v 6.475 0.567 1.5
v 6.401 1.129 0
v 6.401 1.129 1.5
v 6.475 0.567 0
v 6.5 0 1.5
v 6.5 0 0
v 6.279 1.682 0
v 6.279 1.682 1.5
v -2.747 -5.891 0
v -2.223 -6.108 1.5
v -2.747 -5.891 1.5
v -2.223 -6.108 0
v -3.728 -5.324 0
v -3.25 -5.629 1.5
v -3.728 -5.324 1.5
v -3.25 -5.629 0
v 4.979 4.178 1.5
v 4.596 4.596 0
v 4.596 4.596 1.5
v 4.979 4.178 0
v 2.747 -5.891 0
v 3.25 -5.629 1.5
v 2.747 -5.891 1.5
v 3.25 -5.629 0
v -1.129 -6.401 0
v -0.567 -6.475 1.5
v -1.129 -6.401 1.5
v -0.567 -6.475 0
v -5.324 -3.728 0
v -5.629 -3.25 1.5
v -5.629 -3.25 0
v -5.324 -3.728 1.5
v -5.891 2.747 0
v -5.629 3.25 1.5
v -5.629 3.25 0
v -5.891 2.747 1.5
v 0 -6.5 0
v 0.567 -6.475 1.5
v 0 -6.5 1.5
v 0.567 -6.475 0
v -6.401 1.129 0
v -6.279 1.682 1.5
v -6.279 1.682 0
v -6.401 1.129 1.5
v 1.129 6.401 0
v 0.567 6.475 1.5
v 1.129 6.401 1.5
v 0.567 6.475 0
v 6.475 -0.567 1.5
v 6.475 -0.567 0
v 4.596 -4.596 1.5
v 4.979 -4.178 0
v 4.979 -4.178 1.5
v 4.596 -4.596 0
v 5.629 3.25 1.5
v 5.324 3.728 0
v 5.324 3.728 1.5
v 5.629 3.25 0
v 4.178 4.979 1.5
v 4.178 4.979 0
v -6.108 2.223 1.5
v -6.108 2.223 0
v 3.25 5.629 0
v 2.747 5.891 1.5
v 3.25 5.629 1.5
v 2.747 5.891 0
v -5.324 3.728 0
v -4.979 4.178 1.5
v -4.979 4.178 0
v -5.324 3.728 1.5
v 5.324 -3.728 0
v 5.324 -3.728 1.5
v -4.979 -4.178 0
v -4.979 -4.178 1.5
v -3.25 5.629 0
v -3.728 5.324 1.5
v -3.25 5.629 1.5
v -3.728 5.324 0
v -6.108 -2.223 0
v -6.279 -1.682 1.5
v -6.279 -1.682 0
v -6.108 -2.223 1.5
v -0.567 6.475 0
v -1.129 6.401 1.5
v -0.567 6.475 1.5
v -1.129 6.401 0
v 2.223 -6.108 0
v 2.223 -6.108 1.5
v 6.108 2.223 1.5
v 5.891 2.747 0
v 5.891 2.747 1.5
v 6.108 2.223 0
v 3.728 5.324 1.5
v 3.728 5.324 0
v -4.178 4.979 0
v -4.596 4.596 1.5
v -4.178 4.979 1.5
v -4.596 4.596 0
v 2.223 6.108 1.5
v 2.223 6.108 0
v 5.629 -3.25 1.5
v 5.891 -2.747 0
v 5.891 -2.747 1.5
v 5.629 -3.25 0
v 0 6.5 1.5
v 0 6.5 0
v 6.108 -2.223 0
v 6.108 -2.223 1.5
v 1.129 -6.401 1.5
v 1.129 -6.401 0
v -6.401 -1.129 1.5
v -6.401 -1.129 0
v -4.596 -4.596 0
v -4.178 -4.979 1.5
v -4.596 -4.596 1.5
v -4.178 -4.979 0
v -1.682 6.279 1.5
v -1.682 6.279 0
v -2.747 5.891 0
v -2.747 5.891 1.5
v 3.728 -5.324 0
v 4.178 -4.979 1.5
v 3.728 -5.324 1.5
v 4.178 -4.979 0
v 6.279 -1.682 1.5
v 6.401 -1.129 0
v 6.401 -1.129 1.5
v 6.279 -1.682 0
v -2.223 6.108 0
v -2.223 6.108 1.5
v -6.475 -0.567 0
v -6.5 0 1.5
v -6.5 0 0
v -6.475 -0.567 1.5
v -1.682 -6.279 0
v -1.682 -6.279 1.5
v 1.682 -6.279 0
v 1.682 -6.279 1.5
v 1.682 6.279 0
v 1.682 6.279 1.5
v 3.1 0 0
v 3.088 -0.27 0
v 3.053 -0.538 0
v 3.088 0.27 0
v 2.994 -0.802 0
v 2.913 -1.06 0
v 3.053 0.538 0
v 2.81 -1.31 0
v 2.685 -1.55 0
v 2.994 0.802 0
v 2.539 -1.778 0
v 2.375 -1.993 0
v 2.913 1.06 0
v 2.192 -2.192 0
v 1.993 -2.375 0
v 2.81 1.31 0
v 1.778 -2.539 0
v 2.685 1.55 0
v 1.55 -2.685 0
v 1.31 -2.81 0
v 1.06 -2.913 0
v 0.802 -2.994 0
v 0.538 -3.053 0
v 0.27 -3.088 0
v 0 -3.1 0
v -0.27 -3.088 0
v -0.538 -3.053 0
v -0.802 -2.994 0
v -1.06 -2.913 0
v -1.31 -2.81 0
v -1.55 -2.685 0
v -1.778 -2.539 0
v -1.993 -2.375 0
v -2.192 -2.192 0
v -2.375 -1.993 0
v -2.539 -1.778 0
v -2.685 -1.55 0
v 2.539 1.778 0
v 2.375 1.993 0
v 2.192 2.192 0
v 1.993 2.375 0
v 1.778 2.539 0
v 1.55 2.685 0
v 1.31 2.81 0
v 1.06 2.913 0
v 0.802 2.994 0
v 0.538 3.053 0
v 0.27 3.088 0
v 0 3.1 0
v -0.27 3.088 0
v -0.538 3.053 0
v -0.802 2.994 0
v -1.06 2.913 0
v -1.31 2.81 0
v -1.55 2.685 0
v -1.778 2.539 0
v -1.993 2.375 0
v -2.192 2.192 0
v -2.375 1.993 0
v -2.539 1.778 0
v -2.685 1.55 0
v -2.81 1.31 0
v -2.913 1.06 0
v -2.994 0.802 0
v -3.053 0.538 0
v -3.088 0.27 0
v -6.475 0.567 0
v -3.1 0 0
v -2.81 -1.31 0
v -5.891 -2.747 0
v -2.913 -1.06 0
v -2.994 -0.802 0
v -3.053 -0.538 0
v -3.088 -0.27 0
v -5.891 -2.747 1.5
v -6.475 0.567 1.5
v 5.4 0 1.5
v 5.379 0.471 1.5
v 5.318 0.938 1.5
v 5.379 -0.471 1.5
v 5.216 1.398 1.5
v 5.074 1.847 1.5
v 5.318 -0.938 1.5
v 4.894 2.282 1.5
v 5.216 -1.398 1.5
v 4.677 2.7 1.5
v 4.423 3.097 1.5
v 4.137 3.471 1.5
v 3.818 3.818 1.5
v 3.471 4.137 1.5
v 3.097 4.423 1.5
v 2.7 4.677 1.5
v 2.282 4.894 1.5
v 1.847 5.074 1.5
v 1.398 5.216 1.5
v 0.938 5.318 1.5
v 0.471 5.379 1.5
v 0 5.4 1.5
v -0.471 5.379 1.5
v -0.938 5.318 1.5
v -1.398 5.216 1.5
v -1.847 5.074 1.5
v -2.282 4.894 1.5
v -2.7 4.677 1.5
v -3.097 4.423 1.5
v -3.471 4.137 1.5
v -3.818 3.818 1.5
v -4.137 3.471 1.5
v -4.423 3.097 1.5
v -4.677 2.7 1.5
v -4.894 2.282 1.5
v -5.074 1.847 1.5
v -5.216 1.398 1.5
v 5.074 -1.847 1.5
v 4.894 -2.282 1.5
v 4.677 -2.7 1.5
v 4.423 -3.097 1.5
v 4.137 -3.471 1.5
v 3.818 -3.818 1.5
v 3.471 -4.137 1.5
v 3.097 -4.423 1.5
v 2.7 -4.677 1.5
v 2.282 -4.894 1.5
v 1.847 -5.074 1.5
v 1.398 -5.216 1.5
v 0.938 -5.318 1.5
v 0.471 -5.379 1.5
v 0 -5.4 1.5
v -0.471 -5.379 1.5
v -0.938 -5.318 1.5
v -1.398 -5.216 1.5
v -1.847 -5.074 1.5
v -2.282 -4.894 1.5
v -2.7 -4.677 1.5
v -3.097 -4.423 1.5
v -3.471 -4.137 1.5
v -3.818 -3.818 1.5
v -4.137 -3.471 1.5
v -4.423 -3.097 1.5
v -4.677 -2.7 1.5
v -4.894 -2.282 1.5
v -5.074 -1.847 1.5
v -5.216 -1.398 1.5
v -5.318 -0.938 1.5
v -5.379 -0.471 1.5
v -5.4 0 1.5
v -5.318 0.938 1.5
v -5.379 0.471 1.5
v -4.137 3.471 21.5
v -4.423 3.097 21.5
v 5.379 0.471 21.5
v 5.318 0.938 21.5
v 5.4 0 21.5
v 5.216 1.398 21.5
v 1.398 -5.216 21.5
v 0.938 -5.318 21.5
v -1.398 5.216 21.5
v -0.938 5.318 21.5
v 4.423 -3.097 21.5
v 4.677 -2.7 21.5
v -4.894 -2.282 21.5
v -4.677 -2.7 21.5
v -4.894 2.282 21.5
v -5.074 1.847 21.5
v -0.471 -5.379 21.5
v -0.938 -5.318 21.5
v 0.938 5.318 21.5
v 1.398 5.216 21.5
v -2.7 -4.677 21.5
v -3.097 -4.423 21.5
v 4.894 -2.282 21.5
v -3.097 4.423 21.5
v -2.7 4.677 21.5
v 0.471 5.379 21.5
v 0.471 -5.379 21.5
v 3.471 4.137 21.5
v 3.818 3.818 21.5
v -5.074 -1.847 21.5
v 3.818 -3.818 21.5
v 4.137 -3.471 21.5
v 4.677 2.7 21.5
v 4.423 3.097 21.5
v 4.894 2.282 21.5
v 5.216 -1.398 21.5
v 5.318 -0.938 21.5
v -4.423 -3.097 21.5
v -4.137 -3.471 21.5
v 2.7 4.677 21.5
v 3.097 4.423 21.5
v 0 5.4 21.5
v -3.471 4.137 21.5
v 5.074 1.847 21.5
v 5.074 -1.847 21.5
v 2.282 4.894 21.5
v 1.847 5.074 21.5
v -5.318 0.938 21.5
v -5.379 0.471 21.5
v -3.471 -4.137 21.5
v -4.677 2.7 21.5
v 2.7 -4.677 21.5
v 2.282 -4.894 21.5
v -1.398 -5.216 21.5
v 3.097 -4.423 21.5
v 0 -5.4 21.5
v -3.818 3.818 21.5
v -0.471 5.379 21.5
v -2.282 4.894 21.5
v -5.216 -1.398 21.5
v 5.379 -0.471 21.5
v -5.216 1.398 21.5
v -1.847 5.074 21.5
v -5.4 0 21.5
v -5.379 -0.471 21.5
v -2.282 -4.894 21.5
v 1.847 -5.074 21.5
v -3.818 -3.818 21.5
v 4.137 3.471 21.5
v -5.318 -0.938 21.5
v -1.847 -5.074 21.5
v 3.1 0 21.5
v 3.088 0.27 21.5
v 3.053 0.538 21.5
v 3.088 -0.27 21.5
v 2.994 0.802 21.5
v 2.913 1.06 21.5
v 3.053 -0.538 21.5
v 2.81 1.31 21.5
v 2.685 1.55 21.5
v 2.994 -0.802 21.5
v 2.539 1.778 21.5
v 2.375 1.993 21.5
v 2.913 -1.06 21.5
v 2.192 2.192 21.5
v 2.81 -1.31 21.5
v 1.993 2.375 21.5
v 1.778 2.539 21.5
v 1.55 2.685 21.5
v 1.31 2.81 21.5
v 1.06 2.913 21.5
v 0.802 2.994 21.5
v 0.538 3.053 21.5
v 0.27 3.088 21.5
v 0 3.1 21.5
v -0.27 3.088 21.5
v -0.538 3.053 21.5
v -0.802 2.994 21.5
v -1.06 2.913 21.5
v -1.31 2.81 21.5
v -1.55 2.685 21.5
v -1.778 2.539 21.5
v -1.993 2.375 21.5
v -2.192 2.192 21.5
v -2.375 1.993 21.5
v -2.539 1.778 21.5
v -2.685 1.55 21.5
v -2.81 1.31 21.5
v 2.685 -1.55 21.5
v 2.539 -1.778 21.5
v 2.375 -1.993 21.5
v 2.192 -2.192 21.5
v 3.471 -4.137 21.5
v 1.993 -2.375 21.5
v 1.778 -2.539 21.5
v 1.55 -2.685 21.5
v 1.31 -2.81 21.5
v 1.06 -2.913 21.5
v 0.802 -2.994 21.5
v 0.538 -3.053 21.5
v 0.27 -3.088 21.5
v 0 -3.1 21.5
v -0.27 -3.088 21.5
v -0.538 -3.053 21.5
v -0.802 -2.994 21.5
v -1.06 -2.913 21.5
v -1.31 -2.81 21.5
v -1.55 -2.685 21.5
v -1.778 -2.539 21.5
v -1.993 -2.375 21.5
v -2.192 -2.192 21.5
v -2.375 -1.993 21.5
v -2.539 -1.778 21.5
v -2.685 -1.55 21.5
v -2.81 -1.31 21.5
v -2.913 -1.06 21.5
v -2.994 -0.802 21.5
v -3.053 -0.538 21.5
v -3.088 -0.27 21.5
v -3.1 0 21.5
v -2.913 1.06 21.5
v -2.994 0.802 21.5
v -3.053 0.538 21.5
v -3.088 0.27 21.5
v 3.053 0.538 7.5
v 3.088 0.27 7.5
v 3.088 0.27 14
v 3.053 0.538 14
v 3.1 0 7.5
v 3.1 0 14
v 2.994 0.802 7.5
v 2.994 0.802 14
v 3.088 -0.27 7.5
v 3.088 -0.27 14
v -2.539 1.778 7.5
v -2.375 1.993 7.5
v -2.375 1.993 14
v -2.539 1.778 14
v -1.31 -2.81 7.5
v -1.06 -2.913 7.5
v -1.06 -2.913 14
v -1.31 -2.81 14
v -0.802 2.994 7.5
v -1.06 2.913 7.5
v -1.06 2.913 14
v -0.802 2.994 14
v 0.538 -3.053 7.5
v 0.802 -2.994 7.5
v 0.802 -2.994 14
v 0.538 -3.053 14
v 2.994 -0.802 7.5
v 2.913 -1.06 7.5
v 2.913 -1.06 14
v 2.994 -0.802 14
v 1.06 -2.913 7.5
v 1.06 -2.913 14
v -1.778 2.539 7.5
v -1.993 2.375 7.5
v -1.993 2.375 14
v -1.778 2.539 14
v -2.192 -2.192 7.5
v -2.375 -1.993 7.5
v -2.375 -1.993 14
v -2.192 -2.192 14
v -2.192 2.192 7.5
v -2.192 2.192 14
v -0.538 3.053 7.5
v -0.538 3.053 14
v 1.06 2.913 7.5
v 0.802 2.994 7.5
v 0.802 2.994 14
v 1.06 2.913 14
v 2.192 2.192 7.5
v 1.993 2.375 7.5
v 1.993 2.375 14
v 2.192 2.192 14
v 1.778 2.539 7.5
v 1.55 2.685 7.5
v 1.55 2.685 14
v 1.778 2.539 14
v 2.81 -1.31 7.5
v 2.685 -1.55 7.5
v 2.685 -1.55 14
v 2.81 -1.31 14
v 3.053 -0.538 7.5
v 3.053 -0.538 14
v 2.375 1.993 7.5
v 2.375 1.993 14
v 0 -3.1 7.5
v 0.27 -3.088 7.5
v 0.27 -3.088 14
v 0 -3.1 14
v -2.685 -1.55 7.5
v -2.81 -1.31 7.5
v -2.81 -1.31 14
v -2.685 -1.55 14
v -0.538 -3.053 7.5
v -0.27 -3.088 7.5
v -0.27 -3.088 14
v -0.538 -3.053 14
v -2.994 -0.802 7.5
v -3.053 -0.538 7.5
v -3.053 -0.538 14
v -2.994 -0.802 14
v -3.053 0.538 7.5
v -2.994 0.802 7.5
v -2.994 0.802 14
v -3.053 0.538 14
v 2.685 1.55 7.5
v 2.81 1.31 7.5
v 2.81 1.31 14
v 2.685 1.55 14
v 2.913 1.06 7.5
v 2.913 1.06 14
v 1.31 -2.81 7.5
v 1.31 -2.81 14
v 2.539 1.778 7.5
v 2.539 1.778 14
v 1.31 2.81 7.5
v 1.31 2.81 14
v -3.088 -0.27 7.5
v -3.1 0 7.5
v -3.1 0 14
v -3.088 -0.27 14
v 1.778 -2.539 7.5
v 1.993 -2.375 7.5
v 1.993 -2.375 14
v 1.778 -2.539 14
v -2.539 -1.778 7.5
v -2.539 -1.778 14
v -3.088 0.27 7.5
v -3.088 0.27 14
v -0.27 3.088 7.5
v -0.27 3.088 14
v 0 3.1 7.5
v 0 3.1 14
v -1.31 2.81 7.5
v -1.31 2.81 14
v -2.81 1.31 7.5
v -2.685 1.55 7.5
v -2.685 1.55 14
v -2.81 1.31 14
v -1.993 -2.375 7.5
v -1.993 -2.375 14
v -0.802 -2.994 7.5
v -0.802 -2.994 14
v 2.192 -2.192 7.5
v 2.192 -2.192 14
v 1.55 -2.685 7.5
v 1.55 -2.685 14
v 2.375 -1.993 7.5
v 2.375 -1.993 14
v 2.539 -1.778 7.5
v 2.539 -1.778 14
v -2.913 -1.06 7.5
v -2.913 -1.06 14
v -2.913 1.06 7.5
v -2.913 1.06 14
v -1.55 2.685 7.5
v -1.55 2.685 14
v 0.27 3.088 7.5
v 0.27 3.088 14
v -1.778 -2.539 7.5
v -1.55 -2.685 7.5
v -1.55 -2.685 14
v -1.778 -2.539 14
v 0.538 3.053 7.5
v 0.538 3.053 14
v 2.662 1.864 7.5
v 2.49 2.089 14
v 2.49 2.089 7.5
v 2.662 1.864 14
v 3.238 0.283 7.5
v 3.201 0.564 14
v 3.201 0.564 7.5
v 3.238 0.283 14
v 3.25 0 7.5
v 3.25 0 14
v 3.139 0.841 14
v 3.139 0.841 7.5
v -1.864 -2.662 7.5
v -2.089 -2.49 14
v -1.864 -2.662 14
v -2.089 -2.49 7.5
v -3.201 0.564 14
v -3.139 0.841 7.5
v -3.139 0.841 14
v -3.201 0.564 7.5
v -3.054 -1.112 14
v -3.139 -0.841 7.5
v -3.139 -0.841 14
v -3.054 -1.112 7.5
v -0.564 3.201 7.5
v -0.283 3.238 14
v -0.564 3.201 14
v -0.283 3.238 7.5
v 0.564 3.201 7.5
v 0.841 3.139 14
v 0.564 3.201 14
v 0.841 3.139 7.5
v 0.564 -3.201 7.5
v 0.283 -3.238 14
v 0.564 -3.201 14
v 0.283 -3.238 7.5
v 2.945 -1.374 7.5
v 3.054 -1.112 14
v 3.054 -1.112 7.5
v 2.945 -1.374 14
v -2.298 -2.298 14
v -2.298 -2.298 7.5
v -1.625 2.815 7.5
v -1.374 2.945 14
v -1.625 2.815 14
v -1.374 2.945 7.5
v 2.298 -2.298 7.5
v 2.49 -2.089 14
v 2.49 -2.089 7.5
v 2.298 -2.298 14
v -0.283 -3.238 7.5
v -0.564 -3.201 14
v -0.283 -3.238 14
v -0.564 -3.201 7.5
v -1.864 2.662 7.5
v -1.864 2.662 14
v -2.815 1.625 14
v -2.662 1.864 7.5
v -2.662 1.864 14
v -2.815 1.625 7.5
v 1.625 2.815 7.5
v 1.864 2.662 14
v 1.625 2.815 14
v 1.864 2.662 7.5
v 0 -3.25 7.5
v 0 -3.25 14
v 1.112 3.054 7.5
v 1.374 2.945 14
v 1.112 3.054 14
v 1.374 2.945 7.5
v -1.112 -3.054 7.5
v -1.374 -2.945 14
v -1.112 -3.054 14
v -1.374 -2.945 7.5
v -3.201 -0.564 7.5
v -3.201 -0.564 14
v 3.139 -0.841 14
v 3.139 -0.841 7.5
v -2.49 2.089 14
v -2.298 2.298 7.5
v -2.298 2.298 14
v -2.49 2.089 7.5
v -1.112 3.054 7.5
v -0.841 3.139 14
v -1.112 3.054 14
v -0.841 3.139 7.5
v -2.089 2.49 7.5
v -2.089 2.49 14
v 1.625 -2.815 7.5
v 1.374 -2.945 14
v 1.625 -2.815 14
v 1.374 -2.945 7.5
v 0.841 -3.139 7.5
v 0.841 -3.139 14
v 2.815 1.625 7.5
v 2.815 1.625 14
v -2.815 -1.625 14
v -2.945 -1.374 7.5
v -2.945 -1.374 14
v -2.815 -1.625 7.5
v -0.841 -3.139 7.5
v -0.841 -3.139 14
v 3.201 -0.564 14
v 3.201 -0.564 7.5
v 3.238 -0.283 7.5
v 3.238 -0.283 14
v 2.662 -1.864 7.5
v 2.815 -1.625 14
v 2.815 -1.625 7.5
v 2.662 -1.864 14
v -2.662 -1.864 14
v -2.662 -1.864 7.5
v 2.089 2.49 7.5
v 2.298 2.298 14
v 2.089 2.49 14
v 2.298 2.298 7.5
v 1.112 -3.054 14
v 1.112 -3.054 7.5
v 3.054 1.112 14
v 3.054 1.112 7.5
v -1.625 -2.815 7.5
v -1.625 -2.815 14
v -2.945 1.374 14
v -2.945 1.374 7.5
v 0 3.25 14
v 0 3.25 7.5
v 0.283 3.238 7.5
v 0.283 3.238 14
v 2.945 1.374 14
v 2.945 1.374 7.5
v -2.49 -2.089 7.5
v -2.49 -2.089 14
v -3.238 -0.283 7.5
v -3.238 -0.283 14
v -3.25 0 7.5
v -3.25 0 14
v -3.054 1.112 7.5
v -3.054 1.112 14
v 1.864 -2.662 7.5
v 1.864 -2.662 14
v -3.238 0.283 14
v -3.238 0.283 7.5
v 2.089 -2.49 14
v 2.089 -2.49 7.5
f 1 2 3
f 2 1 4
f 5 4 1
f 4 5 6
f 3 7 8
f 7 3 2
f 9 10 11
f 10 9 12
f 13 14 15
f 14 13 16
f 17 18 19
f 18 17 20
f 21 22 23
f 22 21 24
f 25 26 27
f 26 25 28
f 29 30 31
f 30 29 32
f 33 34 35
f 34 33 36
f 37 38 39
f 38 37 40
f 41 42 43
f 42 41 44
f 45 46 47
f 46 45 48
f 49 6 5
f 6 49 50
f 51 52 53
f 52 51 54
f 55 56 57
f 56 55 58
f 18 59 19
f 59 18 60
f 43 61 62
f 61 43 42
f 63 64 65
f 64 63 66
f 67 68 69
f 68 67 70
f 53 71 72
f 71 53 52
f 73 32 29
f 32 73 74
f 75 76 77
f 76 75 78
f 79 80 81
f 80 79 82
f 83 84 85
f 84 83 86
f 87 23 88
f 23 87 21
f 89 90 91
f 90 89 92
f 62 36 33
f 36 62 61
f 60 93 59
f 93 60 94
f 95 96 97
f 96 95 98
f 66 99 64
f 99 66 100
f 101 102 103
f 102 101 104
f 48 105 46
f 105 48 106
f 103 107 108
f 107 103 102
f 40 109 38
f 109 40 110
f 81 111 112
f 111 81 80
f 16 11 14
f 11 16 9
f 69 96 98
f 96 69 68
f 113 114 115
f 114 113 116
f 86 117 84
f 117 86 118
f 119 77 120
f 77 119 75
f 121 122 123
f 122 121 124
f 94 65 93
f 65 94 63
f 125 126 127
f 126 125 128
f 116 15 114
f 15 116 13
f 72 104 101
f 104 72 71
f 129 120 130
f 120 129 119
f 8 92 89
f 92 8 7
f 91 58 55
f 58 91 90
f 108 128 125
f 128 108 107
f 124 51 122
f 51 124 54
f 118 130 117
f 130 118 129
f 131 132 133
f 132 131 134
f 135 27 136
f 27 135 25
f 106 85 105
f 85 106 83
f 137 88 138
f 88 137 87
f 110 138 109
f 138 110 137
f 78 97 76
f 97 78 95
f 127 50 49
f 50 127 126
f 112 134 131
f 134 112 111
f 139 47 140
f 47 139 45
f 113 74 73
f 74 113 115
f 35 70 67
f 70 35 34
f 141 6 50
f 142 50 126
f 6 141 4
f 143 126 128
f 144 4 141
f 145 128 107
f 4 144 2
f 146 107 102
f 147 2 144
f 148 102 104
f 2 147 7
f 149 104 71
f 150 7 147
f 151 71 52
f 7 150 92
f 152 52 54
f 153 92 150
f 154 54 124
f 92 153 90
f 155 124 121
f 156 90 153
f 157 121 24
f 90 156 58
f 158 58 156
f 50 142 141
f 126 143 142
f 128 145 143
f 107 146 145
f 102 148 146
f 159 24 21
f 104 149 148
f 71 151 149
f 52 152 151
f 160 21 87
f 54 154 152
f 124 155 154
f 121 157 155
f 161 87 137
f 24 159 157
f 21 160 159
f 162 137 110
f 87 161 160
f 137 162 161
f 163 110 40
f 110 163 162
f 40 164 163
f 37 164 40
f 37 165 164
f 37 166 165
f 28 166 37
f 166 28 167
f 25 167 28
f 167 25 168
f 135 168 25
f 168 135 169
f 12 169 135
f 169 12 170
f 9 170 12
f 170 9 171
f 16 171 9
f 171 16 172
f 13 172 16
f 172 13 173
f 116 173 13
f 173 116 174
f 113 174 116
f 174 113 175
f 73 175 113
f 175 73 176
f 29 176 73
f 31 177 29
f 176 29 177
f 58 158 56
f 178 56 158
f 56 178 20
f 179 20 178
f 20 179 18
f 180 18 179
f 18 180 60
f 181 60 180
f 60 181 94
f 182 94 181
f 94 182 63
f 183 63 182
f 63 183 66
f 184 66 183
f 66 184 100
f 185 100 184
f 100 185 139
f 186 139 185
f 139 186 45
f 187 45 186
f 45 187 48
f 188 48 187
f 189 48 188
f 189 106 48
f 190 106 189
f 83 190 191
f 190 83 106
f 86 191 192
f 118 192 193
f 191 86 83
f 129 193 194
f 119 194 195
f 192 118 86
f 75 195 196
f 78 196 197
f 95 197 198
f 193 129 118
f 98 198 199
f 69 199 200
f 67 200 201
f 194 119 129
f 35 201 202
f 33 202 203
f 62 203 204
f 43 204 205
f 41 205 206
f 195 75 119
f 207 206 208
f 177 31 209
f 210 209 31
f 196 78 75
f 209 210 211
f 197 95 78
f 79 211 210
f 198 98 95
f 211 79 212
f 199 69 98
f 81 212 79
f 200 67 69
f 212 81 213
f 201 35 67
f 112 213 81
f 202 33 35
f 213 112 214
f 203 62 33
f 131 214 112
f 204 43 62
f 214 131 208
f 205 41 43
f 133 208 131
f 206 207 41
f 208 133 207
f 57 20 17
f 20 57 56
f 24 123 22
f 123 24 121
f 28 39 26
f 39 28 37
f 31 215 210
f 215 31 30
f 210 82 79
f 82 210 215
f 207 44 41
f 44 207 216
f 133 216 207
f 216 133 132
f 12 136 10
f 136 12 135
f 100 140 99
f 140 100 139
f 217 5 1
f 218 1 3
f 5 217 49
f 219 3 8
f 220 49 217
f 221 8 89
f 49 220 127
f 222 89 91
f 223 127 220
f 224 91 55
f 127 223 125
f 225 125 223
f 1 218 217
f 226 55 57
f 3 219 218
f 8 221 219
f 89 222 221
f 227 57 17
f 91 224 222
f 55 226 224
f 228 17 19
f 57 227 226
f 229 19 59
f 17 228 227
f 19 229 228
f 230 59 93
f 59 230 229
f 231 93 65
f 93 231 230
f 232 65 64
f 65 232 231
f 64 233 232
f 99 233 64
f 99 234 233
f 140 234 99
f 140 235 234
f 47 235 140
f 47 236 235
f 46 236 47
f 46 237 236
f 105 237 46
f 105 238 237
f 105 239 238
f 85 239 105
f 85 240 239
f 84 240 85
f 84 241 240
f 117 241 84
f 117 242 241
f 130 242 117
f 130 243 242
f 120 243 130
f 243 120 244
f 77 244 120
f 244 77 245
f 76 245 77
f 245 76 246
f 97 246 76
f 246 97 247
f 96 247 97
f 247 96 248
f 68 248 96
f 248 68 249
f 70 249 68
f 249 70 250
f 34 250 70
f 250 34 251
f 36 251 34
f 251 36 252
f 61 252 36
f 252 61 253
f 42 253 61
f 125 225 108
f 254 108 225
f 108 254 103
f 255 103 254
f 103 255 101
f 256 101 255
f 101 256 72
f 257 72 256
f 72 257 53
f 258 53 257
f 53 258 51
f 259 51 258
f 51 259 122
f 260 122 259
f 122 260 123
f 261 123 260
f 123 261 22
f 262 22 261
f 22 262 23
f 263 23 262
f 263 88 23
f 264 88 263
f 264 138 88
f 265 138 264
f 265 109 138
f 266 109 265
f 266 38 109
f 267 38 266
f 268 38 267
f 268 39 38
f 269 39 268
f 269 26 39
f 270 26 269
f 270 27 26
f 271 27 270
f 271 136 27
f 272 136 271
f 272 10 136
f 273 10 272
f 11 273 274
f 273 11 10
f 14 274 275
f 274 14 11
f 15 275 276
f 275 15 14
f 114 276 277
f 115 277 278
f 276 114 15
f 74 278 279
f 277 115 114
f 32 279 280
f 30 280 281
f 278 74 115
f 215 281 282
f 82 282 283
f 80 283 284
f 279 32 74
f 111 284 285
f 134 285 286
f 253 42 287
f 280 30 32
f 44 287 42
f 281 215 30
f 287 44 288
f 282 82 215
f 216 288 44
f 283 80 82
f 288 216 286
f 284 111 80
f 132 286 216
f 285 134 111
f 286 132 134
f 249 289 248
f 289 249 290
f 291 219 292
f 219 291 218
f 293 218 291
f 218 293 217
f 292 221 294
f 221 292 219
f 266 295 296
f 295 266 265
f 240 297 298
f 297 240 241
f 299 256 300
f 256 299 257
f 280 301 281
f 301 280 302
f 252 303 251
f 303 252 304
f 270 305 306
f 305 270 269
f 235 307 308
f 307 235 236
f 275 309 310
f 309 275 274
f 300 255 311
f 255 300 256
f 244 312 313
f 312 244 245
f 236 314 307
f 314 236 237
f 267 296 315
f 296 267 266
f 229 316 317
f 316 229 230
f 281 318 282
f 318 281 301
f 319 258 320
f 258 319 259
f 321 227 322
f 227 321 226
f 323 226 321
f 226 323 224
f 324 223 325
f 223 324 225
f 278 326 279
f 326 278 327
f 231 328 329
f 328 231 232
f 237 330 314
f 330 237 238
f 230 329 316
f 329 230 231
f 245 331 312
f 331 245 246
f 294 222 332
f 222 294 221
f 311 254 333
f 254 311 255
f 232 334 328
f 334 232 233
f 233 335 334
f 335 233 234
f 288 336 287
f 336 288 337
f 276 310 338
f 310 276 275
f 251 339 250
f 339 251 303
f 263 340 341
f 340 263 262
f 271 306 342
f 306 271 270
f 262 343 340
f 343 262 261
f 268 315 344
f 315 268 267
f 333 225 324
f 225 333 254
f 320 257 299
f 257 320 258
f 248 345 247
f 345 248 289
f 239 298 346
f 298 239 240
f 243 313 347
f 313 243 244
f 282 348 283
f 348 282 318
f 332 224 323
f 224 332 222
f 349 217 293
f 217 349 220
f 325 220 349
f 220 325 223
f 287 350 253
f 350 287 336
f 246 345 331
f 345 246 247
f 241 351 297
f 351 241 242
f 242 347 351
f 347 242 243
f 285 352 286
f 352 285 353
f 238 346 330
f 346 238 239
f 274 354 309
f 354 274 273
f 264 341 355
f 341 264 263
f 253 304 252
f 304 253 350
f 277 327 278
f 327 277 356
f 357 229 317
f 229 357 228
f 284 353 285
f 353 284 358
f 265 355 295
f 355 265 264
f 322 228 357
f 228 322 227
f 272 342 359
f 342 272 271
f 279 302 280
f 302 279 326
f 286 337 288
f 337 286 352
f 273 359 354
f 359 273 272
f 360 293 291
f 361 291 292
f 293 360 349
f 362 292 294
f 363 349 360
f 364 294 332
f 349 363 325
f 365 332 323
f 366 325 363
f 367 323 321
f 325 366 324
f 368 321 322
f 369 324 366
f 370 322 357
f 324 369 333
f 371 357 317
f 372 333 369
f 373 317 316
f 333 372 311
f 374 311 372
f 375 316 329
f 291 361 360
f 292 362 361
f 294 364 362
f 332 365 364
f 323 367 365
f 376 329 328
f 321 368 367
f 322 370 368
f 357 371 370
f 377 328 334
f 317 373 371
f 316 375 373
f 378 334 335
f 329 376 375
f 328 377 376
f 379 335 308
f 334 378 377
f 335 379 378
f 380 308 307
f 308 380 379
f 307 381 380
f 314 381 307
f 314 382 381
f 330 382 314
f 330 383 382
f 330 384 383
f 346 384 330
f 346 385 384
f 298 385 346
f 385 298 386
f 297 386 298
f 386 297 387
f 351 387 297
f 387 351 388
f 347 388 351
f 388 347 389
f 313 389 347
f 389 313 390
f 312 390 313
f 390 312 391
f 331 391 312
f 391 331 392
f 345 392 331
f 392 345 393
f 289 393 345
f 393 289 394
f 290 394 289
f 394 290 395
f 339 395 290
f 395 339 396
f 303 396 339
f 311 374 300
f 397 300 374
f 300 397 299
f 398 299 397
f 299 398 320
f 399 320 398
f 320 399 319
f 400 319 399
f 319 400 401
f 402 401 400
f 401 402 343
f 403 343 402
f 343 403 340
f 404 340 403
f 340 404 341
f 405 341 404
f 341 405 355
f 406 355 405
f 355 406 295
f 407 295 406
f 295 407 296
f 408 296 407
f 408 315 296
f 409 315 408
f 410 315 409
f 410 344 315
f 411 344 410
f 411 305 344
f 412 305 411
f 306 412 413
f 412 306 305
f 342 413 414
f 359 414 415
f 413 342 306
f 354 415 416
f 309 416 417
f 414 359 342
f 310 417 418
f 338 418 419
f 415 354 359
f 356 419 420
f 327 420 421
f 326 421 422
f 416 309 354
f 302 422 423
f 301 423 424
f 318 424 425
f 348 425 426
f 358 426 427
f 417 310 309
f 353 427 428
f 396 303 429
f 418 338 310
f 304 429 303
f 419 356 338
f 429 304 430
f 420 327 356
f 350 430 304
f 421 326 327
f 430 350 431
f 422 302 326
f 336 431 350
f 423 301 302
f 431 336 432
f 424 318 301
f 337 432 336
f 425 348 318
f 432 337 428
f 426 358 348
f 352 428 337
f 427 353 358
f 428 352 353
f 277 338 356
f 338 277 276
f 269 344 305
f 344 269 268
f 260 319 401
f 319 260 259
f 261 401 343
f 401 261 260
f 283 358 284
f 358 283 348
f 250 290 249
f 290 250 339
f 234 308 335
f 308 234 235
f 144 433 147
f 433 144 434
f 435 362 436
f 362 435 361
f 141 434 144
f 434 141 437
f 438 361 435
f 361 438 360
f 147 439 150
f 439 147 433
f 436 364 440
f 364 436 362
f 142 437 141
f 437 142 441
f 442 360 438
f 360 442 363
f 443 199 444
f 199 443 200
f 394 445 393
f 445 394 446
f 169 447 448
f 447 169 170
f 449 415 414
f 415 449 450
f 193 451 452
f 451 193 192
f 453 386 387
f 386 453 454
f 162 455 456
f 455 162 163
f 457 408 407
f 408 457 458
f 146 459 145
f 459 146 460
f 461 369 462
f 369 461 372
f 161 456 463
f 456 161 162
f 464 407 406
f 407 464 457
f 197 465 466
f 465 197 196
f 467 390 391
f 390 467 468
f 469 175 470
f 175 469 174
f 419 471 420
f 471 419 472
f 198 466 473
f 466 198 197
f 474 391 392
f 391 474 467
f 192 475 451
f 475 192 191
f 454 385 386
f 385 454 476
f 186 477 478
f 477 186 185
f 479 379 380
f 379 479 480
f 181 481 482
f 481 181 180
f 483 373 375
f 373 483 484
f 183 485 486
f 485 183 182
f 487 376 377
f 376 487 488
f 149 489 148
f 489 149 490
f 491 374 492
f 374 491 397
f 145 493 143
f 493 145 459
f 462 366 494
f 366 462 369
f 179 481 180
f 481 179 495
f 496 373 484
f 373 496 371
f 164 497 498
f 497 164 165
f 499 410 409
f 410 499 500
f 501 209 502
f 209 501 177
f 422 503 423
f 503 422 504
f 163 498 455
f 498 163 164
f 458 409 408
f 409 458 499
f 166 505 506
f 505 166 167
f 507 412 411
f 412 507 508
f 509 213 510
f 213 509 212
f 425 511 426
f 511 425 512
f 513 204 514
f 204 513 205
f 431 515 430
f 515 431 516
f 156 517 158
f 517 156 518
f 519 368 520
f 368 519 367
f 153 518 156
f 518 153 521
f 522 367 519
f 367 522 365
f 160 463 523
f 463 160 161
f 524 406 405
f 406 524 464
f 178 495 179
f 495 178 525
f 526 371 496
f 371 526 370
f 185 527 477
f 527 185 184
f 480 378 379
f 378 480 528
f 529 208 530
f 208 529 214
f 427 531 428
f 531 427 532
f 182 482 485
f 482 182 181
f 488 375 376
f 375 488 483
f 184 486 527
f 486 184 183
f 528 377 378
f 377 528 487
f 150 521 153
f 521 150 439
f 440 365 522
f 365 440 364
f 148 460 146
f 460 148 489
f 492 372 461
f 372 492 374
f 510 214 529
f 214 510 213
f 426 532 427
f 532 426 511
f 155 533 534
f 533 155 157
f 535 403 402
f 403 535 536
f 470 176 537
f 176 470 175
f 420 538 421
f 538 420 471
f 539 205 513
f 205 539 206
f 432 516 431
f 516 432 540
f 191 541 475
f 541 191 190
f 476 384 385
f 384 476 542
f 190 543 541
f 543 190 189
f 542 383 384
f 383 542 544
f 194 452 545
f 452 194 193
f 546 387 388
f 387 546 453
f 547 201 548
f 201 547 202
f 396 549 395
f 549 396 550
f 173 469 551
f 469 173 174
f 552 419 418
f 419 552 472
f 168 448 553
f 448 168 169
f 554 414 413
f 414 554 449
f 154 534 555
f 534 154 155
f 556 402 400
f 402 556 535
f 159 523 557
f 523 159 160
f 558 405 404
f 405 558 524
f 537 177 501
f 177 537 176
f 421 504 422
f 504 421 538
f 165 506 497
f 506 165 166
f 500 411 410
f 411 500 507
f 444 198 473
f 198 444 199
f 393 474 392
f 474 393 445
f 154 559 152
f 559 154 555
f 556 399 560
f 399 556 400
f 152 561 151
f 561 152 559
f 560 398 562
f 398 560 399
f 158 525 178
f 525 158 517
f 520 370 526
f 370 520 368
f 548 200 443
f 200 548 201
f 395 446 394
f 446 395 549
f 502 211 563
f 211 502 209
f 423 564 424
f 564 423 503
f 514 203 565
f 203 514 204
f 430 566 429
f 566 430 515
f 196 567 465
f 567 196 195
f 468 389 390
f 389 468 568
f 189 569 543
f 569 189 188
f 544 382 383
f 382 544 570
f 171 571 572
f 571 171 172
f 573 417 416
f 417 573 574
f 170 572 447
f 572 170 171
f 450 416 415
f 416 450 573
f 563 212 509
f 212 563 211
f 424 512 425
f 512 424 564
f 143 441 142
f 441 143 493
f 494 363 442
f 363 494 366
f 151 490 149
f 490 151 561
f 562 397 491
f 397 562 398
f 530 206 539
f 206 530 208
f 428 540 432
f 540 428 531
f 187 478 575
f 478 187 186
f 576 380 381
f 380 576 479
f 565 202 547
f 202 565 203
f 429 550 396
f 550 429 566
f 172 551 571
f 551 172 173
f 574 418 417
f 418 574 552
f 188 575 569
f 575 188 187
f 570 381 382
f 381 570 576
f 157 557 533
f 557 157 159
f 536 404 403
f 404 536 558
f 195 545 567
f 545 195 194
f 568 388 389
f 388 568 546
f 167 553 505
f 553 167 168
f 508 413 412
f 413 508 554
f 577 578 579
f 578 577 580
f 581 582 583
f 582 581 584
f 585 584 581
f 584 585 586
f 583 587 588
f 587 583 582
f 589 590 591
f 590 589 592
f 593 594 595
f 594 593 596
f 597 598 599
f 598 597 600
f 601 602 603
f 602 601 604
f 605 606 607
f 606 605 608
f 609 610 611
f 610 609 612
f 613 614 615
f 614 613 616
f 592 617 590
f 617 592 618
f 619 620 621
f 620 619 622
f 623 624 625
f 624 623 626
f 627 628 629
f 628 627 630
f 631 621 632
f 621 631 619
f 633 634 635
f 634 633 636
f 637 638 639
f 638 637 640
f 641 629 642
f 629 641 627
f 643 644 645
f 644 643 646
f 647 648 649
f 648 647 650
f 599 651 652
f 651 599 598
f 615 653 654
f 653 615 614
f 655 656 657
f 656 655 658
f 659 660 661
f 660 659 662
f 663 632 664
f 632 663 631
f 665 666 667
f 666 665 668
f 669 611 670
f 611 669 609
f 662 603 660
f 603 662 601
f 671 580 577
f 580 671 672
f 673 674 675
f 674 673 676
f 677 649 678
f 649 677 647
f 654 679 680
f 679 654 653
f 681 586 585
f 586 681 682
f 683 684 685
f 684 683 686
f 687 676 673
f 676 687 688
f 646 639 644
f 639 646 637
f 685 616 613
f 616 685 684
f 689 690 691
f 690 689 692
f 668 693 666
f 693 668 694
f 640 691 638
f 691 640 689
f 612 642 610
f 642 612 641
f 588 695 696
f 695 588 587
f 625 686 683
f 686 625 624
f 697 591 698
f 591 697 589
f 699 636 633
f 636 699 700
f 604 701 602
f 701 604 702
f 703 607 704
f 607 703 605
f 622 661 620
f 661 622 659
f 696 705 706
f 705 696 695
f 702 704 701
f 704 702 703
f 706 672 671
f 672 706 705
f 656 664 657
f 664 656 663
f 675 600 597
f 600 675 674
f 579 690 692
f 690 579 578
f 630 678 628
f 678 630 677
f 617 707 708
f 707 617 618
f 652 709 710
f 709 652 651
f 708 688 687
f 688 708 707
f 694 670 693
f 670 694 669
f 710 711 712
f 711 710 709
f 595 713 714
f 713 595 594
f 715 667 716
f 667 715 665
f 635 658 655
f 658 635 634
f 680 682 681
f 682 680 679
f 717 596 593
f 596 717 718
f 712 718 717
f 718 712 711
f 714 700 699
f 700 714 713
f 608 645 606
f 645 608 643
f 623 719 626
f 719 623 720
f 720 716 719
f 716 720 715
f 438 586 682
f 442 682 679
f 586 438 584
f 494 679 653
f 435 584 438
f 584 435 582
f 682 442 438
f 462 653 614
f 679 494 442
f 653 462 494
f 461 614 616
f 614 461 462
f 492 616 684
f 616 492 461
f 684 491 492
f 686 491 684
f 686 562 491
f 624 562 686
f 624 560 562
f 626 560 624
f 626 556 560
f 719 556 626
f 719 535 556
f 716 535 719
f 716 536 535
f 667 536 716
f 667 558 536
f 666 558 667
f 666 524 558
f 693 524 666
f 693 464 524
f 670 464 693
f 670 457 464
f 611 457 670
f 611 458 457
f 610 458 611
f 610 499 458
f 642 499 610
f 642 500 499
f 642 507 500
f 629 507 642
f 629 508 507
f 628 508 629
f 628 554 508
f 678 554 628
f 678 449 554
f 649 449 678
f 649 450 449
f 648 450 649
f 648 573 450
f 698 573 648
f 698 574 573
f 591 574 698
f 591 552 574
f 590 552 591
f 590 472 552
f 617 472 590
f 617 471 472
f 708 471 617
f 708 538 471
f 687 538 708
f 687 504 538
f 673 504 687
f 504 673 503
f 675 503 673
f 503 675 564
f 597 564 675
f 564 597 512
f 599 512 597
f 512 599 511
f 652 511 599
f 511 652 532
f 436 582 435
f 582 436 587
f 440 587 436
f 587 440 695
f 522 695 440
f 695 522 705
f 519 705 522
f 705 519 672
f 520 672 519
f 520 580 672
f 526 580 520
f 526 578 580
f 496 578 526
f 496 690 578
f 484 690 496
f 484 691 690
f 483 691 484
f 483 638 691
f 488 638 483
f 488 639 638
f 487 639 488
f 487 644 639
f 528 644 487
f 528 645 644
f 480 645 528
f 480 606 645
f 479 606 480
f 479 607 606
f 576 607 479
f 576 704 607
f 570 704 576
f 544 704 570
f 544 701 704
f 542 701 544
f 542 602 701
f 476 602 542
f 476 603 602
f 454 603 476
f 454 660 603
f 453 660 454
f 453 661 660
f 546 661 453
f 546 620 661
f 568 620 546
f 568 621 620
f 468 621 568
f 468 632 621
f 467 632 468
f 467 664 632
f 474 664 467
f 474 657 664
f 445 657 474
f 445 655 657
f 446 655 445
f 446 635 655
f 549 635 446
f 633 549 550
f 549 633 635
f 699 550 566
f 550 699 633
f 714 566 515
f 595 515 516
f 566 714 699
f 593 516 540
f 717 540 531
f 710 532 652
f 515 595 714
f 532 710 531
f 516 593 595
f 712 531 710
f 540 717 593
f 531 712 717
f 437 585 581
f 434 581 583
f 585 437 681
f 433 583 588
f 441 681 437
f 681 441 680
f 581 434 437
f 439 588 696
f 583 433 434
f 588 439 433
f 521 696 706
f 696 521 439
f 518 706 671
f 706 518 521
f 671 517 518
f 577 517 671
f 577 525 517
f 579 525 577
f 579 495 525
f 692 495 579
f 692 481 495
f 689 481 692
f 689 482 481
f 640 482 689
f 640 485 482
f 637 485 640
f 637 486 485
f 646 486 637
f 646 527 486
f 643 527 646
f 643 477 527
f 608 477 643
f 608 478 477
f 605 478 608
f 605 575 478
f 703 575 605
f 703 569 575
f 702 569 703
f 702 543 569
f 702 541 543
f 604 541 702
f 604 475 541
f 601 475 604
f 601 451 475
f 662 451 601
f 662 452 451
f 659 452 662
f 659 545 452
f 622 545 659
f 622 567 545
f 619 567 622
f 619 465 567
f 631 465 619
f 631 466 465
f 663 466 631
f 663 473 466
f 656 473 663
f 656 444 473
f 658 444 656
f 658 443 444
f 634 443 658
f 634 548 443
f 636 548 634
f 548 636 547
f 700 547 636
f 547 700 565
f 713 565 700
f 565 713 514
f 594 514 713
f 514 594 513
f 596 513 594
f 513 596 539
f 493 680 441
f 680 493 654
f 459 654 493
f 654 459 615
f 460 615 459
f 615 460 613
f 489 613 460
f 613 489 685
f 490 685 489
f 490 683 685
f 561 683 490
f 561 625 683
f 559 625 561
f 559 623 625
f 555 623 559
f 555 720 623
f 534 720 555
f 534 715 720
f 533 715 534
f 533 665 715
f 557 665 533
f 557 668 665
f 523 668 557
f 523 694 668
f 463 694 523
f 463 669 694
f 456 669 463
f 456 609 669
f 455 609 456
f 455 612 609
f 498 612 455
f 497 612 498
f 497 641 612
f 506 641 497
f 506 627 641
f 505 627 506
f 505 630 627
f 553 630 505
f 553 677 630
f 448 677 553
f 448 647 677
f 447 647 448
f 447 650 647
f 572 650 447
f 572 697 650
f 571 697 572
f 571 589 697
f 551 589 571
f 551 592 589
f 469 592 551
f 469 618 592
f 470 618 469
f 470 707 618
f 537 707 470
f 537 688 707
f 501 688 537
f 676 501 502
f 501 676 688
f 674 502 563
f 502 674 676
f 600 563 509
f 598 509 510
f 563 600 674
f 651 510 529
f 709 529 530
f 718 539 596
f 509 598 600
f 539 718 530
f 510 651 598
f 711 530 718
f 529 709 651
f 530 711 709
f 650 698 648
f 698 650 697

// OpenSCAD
// Adapter sleeve - a collar with a sleeve body that lines a 1.5 mL tube rack hole to hold a
// 0.2 mL PCR tube, with a through bore. NOVEL general part (a generic tube adapter).
//

top_d     = 13;
body_d    = 10.8;
collar_t  = 1.5;
body_h    = 21.5;
bore_d    = 6.2;

$fn = 72;

top   = top_d / 2;
body  = body_d / 2;
base  = top_d / 2;

difference() {
    union() {
        cylinder(h = collar_t, d = top_d);                 // collar on the bed
        cylinder(h = body_h, d = body_d);                   // sleeve body
    }
    translate([0, 0, -1]) cylinder(h = body_h + 2, d = bore_d);   // through bore
    translate([0, 0, base + 1]) cylinder(h = body_h - 2 * (base + 1), d = base);  // inner wall above the collar
}
